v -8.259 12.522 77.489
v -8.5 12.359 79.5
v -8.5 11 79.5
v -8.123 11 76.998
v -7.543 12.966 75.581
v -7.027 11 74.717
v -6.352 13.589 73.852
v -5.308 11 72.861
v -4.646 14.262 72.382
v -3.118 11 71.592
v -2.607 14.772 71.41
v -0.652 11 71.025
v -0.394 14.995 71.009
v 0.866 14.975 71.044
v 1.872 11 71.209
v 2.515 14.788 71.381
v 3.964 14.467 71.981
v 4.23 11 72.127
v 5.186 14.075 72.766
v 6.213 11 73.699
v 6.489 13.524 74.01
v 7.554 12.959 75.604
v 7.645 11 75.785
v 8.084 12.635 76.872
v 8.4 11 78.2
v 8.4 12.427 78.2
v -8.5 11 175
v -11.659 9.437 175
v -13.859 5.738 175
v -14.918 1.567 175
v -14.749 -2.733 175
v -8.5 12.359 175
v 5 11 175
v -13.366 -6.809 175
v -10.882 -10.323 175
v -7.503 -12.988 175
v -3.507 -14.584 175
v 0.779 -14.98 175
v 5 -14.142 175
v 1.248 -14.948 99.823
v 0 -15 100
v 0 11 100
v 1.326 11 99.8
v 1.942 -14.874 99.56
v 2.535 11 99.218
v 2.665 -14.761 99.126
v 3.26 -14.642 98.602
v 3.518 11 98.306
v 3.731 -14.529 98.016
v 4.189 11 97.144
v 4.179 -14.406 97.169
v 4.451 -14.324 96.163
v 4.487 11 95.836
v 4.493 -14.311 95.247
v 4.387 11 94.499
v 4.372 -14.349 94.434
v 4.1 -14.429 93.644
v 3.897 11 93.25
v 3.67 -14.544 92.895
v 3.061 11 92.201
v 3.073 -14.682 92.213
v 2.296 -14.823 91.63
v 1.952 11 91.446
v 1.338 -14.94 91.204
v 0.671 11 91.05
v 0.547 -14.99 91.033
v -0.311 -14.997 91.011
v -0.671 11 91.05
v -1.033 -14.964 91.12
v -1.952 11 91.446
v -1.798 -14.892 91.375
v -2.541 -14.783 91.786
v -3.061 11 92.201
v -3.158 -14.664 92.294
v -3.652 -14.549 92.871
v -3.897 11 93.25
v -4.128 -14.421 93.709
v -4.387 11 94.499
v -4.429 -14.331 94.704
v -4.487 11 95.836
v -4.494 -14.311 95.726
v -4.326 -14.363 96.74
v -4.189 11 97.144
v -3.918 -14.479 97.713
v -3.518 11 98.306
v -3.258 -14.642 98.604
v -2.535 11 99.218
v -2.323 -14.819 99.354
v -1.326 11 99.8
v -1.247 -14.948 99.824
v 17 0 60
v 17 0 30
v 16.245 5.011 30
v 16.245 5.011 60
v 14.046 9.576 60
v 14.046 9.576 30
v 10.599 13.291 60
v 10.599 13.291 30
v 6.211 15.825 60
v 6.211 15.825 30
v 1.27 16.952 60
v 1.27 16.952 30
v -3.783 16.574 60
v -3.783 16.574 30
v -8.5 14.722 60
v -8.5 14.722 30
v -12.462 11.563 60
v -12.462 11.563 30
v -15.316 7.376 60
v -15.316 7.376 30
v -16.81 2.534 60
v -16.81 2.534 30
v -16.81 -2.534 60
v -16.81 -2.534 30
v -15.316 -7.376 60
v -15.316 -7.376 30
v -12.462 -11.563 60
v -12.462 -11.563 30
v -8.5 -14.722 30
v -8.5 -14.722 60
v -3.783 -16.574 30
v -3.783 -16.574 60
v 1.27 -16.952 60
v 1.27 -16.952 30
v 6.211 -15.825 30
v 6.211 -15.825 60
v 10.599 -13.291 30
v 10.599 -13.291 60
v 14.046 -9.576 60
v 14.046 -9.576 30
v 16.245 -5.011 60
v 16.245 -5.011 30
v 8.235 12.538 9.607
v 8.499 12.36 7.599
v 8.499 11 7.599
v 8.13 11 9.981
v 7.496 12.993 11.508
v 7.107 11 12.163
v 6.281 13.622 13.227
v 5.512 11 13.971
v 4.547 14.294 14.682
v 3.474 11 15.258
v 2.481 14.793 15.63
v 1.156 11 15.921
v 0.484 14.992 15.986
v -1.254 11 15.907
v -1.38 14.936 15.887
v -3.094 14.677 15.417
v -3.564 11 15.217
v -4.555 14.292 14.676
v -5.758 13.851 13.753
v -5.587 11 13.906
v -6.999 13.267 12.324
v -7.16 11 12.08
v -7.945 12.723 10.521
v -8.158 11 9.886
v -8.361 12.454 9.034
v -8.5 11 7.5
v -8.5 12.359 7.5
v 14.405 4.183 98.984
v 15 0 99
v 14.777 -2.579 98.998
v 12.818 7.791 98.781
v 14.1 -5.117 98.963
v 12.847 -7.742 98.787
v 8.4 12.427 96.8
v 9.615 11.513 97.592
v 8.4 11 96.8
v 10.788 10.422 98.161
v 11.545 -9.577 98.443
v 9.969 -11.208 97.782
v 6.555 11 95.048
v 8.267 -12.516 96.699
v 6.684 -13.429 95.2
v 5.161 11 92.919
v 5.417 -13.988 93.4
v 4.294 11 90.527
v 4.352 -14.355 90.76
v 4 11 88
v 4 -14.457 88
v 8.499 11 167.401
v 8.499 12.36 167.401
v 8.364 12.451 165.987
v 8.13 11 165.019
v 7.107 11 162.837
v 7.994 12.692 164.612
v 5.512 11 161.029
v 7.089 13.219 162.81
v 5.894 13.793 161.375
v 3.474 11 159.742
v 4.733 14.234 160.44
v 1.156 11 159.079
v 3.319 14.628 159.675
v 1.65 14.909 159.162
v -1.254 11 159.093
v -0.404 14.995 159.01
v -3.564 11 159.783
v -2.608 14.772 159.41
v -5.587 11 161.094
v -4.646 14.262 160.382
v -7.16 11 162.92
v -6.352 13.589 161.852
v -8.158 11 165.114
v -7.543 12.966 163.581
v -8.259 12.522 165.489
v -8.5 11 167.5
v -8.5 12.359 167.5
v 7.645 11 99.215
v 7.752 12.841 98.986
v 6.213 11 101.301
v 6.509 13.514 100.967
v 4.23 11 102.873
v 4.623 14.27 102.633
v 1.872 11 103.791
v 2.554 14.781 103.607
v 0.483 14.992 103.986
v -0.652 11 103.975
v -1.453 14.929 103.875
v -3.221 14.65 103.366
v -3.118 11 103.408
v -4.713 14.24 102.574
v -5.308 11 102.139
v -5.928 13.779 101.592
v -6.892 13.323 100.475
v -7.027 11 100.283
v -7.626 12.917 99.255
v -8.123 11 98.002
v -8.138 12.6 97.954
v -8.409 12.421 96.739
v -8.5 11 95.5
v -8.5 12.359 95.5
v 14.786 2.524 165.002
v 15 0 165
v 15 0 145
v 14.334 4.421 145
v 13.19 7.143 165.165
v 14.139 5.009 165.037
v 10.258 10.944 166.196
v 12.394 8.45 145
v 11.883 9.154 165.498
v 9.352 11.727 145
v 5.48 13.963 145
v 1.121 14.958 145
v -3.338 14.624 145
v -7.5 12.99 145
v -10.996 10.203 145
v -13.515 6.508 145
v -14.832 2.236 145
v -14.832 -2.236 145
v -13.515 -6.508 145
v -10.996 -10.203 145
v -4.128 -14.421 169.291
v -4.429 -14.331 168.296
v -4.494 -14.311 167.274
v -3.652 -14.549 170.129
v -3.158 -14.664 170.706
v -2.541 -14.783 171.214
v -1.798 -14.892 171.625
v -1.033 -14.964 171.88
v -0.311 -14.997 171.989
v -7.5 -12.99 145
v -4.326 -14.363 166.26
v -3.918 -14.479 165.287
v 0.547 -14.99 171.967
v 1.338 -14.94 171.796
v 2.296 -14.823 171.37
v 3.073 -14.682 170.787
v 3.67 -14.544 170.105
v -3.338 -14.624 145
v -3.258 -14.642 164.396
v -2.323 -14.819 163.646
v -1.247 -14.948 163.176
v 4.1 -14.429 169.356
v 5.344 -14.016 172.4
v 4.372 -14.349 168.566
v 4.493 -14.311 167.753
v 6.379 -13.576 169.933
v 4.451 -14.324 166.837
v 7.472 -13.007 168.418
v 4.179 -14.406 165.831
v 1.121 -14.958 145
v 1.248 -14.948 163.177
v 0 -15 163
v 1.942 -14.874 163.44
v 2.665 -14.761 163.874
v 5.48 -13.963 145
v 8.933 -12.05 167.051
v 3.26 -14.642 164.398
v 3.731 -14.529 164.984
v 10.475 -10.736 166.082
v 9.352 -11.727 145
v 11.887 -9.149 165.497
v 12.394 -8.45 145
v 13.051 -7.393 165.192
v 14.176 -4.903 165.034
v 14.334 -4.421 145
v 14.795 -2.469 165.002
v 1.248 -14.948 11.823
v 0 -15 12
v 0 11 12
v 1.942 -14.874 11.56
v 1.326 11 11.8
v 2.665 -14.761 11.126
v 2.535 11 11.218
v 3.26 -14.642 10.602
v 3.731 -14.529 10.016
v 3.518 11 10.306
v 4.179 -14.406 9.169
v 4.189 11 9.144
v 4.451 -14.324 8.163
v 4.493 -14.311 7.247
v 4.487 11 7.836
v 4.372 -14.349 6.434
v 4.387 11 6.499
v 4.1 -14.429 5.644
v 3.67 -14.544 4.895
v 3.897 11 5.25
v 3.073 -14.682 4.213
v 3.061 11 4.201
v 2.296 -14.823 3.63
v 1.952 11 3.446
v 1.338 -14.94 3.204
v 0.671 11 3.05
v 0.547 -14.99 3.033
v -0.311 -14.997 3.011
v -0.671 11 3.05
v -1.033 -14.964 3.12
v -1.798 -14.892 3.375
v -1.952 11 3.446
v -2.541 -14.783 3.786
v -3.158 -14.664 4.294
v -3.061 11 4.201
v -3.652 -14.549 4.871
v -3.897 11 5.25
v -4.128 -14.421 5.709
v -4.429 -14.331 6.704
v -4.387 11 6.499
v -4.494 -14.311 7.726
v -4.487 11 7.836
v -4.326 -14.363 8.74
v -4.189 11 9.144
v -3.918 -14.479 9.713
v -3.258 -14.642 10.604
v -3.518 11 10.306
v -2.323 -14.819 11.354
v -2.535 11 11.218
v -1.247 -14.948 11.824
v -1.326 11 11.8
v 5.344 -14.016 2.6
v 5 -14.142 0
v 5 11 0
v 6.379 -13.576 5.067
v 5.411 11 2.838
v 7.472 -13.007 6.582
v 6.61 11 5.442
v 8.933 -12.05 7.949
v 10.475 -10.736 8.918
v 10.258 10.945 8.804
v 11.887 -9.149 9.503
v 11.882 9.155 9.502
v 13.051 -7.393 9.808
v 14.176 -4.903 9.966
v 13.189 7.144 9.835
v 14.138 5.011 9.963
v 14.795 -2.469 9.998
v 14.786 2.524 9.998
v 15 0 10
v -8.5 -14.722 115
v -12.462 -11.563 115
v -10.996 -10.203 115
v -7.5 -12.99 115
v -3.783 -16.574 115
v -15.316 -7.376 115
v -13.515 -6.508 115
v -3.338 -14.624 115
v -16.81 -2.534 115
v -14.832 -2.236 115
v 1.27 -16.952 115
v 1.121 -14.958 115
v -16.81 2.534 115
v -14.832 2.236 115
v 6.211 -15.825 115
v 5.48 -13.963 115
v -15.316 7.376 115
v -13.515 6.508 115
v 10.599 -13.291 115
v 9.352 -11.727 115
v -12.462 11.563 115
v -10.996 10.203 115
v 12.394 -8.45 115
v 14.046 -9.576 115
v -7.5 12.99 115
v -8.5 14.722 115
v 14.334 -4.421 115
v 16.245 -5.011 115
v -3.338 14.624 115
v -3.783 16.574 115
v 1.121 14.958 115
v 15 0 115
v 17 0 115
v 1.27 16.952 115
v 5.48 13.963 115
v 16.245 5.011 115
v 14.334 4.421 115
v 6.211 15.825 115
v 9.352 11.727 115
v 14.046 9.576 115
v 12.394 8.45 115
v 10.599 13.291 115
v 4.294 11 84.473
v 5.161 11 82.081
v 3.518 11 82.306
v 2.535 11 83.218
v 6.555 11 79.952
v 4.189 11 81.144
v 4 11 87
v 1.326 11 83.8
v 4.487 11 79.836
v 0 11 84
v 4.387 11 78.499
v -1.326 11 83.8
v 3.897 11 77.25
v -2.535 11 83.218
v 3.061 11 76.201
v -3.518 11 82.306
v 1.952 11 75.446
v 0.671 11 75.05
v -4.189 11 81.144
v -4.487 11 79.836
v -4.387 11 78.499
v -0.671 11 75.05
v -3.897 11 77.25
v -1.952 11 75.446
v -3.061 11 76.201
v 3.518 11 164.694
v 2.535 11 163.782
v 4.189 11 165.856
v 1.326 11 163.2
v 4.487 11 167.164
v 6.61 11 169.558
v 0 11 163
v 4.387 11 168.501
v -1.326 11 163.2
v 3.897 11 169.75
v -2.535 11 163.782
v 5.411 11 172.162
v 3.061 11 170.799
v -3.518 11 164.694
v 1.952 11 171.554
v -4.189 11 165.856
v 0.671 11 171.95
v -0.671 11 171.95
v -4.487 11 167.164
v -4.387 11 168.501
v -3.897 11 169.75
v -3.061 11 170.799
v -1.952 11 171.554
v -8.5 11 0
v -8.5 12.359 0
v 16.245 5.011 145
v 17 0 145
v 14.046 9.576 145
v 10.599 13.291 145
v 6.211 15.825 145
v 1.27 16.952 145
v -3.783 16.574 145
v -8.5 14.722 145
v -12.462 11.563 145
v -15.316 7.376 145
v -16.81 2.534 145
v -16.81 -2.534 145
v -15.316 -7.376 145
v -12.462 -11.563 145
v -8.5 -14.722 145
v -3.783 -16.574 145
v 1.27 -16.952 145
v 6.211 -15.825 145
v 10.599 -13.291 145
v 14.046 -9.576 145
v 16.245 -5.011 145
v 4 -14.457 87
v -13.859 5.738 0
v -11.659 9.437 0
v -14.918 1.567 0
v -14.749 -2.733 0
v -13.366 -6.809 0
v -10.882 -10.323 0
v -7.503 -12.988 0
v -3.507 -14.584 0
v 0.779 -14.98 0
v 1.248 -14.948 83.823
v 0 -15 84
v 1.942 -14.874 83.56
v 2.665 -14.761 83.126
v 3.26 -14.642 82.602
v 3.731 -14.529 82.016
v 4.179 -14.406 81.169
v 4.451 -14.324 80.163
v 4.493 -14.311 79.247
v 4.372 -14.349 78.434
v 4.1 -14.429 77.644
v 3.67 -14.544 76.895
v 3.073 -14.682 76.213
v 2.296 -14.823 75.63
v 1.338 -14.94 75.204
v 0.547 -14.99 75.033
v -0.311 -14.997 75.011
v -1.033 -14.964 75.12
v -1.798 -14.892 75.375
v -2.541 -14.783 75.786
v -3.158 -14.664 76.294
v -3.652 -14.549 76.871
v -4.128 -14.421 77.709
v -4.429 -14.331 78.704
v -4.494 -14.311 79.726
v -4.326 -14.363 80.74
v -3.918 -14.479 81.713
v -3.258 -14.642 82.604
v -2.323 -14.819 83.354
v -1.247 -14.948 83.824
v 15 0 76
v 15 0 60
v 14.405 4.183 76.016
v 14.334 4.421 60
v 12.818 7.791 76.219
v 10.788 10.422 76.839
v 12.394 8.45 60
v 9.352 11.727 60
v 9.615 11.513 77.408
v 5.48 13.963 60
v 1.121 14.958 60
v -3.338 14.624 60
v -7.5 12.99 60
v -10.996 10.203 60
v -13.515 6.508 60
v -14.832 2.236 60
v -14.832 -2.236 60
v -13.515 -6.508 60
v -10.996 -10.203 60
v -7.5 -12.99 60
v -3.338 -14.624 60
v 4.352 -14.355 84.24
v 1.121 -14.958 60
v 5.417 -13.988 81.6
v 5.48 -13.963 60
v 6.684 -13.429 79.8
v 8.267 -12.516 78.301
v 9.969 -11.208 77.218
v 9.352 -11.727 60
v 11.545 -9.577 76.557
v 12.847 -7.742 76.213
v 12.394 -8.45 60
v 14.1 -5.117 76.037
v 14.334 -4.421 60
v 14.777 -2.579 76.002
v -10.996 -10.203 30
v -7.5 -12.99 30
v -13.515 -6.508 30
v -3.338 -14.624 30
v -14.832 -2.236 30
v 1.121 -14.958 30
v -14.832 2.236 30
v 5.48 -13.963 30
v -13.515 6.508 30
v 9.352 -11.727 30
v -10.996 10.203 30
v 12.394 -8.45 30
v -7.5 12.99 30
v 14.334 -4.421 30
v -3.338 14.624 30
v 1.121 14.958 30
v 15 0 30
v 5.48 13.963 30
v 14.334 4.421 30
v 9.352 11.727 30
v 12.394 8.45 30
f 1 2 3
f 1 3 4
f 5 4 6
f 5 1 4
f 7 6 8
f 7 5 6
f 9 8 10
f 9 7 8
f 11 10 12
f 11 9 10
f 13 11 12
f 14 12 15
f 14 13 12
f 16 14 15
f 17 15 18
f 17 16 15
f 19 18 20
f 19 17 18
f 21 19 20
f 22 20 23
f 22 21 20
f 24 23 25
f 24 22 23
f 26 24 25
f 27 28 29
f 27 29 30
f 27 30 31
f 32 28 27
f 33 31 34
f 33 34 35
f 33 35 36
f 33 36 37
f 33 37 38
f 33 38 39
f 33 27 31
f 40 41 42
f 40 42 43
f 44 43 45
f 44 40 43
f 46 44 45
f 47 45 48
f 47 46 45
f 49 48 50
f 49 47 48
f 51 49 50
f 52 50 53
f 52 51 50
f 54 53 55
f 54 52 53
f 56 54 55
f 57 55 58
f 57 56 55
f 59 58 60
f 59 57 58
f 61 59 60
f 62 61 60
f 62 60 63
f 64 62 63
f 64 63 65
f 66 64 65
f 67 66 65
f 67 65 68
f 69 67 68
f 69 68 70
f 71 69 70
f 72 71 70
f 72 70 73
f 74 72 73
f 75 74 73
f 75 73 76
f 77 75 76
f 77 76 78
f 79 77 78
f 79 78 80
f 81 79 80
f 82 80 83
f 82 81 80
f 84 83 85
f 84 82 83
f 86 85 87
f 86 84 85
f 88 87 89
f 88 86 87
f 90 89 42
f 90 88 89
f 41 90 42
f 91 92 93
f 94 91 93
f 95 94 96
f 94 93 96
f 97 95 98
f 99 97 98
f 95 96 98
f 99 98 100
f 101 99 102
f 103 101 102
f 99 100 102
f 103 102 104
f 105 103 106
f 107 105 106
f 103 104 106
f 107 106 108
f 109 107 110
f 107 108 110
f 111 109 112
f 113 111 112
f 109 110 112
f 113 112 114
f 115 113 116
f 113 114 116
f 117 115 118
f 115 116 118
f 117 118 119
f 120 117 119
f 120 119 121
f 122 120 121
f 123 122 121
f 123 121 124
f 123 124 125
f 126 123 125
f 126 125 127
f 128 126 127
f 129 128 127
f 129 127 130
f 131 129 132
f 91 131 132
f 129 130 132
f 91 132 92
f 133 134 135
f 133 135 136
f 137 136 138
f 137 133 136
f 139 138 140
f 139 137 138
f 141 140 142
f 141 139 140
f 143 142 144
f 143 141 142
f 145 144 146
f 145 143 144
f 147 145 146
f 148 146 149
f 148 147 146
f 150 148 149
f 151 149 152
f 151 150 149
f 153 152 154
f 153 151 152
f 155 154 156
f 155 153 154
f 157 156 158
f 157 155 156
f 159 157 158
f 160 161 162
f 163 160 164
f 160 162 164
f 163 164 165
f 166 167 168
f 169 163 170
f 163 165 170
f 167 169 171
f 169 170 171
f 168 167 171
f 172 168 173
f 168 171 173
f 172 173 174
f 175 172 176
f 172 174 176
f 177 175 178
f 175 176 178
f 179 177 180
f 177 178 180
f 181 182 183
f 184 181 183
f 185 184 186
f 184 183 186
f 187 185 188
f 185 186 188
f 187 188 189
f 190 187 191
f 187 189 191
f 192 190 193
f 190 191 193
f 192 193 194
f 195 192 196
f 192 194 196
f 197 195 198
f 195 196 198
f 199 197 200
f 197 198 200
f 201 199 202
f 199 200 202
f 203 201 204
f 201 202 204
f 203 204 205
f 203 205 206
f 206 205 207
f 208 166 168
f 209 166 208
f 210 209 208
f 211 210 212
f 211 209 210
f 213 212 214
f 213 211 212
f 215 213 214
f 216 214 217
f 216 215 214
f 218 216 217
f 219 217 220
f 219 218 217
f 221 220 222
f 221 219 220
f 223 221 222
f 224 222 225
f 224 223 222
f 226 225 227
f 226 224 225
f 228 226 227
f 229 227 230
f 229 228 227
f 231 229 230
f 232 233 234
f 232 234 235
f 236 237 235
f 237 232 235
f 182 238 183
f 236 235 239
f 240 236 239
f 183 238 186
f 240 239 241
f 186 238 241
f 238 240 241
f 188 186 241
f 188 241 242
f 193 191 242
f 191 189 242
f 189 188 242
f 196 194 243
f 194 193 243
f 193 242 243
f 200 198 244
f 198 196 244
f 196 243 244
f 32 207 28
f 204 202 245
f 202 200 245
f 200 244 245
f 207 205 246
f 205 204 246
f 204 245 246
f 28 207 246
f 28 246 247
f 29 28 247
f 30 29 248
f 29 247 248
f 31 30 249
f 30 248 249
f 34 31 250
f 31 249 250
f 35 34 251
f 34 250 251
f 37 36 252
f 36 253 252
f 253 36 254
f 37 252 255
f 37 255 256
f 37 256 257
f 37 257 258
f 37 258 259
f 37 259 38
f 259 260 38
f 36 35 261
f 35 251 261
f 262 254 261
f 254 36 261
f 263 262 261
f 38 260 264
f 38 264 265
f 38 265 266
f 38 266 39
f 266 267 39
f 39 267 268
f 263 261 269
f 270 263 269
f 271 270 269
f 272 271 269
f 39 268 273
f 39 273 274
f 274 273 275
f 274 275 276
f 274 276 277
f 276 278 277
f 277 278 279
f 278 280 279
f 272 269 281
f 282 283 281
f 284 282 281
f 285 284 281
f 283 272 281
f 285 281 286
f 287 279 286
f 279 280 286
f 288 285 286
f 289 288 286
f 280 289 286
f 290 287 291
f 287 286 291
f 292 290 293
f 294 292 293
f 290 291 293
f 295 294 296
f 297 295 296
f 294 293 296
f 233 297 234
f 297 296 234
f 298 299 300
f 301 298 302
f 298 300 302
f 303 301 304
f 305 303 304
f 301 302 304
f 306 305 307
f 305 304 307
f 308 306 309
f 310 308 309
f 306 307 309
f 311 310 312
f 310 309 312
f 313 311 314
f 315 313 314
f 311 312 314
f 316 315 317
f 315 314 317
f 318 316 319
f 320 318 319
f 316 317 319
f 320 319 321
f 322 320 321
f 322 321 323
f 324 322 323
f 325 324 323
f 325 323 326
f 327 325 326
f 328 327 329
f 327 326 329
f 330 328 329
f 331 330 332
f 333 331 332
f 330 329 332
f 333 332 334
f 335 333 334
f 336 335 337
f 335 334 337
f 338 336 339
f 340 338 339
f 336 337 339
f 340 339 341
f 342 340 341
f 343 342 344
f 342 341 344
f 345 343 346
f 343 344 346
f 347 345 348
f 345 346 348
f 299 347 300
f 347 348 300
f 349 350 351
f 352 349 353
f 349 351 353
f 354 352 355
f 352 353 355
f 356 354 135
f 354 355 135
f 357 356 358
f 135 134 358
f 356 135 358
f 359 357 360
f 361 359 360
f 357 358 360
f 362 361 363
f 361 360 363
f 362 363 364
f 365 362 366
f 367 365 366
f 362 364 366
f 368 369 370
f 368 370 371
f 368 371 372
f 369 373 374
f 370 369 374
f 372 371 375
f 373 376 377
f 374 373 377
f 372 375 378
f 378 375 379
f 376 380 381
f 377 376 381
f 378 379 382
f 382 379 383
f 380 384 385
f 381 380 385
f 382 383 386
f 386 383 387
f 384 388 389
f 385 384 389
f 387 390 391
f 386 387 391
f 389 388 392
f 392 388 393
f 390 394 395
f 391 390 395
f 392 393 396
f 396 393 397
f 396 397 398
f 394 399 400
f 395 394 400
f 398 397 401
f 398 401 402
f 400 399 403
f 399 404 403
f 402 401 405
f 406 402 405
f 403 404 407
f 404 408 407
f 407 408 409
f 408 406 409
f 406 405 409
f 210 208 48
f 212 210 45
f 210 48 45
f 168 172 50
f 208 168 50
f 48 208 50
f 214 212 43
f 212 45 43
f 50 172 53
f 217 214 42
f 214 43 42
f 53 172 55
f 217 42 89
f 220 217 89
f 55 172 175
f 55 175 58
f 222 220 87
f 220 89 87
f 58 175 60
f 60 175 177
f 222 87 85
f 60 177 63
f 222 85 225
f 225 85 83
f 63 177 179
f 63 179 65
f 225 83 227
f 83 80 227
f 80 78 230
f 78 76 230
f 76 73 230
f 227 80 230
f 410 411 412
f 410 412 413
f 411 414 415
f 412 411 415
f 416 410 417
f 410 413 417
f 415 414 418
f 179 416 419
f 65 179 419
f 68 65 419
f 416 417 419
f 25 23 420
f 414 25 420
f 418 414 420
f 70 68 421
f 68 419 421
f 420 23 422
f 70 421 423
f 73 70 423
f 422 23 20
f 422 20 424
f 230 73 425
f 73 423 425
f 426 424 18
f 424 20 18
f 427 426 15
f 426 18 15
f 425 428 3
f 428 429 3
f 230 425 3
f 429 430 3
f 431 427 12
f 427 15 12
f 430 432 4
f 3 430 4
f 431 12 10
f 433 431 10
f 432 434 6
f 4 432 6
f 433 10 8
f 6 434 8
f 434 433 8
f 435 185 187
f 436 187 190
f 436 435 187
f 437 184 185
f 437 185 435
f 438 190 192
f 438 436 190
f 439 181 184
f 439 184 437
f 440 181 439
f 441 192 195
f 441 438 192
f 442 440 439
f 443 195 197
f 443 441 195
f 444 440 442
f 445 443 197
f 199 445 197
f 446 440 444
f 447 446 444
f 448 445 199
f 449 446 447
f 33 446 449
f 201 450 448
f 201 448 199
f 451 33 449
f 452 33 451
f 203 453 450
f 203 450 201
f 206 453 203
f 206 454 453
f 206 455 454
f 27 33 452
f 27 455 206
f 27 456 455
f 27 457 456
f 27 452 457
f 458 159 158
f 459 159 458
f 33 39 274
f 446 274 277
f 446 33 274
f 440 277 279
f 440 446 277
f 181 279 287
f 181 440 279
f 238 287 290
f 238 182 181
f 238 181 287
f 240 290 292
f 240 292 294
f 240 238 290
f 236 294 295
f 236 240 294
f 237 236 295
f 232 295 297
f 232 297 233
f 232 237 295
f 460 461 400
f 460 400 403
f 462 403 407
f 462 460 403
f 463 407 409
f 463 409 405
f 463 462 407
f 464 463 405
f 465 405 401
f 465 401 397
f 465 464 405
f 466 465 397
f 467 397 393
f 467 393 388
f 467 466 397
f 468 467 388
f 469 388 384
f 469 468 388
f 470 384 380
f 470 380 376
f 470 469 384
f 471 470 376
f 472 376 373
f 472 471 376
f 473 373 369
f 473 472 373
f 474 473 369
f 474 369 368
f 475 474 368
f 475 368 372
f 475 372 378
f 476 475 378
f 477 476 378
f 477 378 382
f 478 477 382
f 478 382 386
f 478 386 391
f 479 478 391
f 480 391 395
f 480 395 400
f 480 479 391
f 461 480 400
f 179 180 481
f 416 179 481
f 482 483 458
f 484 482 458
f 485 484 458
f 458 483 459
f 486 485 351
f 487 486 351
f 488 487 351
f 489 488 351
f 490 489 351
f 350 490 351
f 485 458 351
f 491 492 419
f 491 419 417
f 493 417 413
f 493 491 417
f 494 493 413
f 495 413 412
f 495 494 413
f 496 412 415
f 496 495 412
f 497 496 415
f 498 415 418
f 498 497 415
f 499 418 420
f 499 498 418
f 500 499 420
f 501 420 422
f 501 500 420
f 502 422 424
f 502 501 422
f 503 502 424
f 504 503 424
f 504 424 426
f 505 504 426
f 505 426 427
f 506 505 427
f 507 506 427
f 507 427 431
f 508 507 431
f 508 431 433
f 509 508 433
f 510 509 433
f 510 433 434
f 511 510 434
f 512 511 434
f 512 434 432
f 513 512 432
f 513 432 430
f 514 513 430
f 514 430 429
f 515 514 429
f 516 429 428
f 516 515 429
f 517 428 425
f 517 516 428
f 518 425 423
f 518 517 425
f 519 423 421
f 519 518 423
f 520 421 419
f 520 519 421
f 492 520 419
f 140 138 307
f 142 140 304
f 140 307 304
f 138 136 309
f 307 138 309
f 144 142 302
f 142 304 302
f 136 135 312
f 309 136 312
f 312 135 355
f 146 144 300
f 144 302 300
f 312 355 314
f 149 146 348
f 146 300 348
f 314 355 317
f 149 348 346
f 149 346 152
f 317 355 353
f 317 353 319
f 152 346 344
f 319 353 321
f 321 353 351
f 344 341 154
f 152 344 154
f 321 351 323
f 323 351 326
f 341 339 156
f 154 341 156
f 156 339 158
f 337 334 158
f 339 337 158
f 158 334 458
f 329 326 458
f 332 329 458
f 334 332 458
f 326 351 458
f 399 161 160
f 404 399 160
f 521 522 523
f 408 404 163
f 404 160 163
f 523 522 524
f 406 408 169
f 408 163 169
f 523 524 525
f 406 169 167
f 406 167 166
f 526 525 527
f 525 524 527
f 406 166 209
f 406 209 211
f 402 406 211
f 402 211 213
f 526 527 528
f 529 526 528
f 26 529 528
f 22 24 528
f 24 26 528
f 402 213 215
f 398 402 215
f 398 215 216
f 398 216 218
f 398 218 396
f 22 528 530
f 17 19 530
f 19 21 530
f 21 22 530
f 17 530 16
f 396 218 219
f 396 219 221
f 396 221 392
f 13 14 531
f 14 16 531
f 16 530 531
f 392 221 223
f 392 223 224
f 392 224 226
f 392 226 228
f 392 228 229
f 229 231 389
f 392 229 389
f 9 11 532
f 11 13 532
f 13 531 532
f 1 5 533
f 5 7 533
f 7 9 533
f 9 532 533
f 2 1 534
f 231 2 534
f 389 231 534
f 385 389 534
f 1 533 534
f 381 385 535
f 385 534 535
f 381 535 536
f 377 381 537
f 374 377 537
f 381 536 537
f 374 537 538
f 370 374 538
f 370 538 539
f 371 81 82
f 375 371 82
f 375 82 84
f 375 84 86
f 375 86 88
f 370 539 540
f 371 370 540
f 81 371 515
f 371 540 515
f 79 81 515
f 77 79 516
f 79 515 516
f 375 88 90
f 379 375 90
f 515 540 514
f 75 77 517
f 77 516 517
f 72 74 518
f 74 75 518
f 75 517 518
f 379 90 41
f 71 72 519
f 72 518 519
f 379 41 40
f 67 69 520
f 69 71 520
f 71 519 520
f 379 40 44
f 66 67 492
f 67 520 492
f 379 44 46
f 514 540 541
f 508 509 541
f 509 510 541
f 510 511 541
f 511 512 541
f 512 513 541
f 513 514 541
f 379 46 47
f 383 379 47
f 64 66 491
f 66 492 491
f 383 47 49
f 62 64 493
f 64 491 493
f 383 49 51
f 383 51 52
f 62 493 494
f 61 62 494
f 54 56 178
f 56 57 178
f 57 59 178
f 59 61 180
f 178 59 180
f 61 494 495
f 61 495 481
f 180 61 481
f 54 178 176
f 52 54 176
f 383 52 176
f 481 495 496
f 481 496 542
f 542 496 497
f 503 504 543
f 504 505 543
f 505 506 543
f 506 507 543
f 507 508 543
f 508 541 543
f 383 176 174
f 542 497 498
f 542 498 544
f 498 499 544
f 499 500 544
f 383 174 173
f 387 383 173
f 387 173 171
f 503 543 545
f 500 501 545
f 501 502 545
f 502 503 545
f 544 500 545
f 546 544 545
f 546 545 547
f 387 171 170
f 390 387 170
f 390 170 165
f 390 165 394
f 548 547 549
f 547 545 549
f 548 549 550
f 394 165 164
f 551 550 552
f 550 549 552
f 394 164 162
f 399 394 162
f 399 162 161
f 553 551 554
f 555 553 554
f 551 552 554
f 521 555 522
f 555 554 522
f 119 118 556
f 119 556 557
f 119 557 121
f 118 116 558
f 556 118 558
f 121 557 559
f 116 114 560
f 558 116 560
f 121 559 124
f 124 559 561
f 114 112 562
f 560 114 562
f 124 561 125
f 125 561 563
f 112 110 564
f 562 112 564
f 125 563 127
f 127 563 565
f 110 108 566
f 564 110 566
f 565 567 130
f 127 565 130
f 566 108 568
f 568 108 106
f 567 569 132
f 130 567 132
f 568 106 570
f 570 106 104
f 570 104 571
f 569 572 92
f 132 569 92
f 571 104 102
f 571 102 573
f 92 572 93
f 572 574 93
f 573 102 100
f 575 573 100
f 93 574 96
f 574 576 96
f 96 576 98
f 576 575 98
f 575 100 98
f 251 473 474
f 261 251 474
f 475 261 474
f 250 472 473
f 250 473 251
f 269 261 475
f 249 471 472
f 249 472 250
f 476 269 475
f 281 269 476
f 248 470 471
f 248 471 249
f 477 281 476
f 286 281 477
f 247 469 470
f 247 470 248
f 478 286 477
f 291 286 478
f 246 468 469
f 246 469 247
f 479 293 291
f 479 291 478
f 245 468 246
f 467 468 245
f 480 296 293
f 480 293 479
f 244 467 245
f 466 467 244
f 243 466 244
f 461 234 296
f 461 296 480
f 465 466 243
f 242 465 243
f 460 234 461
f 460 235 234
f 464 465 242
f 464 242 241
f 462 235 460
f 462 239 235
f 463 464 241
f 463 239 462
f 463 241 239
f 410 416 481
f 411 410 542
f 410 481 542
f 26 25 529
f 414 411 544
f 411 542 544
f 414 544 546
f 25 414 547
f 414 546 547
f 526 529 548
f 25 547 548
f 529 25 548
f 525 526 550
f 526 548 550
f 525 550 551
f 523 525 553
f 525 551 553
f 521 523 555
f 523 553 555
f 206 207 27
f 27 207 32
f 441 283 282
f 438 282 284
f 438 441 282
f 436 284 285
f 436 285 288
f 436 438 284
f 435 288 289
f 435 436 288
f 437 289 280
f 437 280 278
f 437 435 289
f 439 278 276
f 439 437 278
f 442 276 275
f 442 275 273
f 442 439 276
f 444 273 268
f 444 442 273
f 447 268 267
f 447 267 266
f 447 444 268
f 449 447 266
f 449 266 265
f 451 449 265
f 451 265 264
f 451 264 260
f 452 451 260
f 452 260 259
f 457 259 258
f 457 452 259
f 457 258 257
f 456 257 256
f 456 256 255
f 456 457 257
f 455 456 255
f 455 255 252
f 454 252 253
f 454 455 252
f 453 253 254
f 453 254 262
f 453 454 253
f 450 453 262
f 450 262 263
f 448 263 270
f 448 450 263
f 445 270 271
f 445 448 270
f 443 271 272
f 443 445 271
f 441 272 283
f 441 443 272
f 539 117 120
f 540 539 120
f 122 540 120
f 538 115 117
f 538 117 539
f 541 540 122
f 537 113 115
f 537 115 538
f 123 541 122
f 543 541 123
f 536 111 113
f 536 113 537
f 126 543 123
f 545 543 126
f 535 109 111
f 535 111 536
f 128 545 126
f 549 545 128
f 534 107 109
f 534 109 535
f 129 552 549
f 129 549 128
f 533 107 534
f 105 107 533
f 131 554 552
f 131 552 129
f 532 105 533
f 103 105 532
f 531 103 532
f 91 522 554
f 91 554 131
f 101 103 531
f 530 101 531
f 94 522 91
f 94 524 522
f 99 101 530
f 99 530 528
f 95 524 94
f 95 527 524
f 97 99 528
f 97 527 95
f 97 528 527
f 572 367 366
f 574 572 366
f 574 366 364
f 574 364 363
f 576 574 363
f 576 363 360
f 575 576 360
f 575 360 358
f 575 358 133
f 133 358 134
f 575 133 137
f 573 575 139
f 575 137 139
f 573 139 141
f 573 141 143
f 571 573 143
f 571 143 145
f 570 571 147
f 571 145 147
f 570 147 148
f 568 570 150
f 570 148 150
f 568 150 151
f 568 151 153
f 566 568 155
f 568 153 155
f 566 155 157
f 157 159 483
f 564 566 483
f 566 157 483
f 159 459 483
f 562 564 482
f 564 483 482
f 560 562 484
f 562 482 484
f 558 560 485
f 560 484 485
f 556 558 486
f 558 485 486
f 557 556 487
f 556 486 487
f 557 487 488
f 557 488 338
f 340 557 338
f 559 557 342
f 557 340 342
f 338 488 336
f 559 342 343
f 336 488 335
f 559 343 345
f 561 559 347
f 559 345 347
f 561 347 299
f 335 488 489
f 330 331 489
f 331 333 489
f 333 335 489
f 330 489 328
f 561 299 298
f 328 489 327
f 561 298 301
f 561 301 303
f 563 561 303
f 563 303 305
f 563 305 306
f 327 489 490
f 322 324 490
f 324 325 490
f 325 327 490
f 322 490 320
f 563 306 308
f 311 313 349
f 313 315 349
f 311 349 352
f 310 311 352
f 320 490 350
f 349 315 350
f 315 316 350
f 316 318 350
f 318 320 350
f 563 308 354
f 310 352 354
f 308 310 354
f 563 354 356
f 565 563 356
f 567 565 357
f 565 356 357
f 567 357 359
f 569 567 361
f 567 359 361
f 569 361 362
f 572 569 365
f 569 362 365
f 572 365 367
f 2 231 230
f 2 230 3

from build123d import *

# Parameters (mm, degrees)
CROQUIS1_R                 = 15
SALIENTE_EXTRUIR1_DEPTH    = 175
CROQUIS2_R                 = 4.5
CORTAR_EXTRUIR1_DEPTH      = 177.281025638
CORTAR_EXTRUIR2_START      = 15
CORTAR_EXTRUIR2_DEPTH      = 4
CROQUIS4_R                 = 10
CORTAR_EXTRUIR3_DEPTH      = 177.281025756
CORTAR_EXTRUIR4_DEPTH      = 177.281025756
CORTAR_EXTRUIR4_DEPTH_BACK = 177.281025756
CROQUIS9_R                 = 4.5
CORTAR_EXTRUIR5_START      = 15
CORTAR_EXTRUIR5_DEPTH      = 4
CORTAR_EXTRUIR6_DEPTH      = 177.281025756
CORTAR_EXTRUIR6_DEPTH_BACK = 177.281025756
SALIENTE_EXTRUIR2_START    = 30
CROQUIS16_R                = 17
CROQUIS16_R_2              = 15
SALIENTE_EXTRUIR2_DEPTH    = 30


with BuildPart() as part:
    # Croquis1 → Saliente-Extruir1 (new body)
    with BuildSketch(Plane.XY):
        Circle(CROQUIS1_R)
    extrude(amount=SALIENTE_EXTRUIR1_DEPTH)

    # Croquis2 → Cortar-Extruir1 (cut, symmetric)
    with BuildSketch(Plane(origin=(0, 0, 0), x_dir=(1, 0, 0), z_dir=(0, 1, 0))):
        with Locations((0, -7.5)):
            Circle(CROQUIS2_R)
    cortar_extruir1 = extrude(amount=CORTAR_EXTRUIR1_DEPTH, both=True, mode=Mode.SUBTRACT)

    # Croquis3 → Cortar-Extruir2 (cut)
    with BuildSketch(Plane(origin=(0, 0, 0), x_dir=(1, 0, 0), z_dir=(0, 1, 0)).offset(CORTAR_EXTRUIR2_START)):
        with BuildLine():
            Line((-8.5, -7.5), (-8.5, 0))
            Line((-8.5, 0), (8.5, 0))
            Line((8.5, 0), (8.5, -7.5))
            ThreePointArc((8.5, -7.5), (0, -16), (-8.5, -7.5))
        make_face()
    cortar_extruir2 = extrude(amount=-CORTAR_EXTRUIR2_DEPTH, mode=Mode.SUBTRACT)

    # Croquis4 → Cortar-Extruir3 (cut, symmetric)
    with BuildSketch(Plane(origin=(0, 0, 0), x_dir=(1, 0, 0), z_dir=(0, 1, 0))):
        with Locations((15, 0)):
            Circle(CROQUIS4_R)
    cortar_extruir3 = extrude(amount=CORTAR_EXTRUIR3_DEPTH, both=True, mode=Mode.SUBTRACT)

    # Simetría1: Cortar-Extruir1, Cortar-Extruir2, Cortar-Extruir3 across plane
    add(cortar_extruir1.mirror(Plane.XY.offset(87.5)), mode=Mode.SUBTRACT)
    add(cortar_extruir2.mirror(Plane.XY.offset(87.5)), mode=Mode.SUBTRACT)
    add(cortar_extruir3.mirror(Plane.XY.offset(87.5)), mode=Mode.SUBTRACT)

    # Croquis9 → Cortar-Extruir4 (cut, two sides: drawn at the far end of the back side and taken through both)
    with BuildSketch(Plane(origin=(0, 0, 0), x_dir=(1, 0, 0), z_dir=(0, 1, 0)).offset(-CORTAR_EXTRUIR4_DEPTH_BACK)):
        with Locations((0, -79.5)):
            Circle(CROQUIS9_R)
        with Locations((0, -95.5)):
            Circle(CROQUIS9_R)
    extrude(amount=CORTAR_EXTRUIR4_DEPTH + CORTAR_EXTRUIR4_DEPTH_BACK, mode=Mode.SUBTRACT)

    # Croquis10 → Cortar-Extruir5 (cut)
    with BuildSketch(Plane(origin=(0, 0, 0), x_dir=(1, 0, 0), z_dir=(0, 1, 0)).offset(CORTAR_EXTRUIR5_START)):
        with BuildLine():
            Line((8.5, -79.5), (8.5, -95.5))
            ThreePointArc((8.5, -95.5), (0, -104), (-8.5, -95.5))
            Line((-8.5, -95.5), (-8.5, -79.5))
            ThreePointArc((-8.5, -79.5), (0, -71), (8.5, -79.5))
        make_face()
    extrude(amount=-CORTAR_EXTRUIR5_DEPTH, mode=Mode.SUBTRACT)

    # Croquis15 → Cortar-Extruir6 (cut, two sides: drawn at the far end of the back side and taken through both)
    with BuildSketch(Plane(origin=(0, 0, 0), x_dir=(1, 0, 0), z_dir=(0, 1, 0)).offset(-CORTAR_EXTRUIR6_DEPTH_BACK)):
        with BuildLine():
            Line((4, -88), (4, -87))
            ThreePointArc((4, -87), (7.221825407, -79.221825407), (15, -76))
            Line((15, -76), (15, -99))
            ThreePointArc((15, -99), (7.221825407, -95.778174593), (4, -88))
        make_face()
    extrude(amount=CORTAR_EXTRUIR6_DEPTH + CORTAR_EXTRUIR6_DEPTH_BACK, mode=Mode.SUBTRACT)

    # Croquis16 → Saliente-Extruir2 (add)
    with BuildSketch(Plane.XY.offset(SALIENTE_EXTRUIR2_START)):
        Circle(CROQUIS16_R)
        Circle(CROQUIS16_R_2, mode=Mode.SUBTRACT)
    saliente_extruir2 = extrude(amount=SALIENTE_EXTRUIR2_DEPTH)

    # Simetría2: Saliente-Extruir2 across plane
    add(saliente_extruir2.mirror(Plane.XY.offset(87.5)))


solid = part.part
